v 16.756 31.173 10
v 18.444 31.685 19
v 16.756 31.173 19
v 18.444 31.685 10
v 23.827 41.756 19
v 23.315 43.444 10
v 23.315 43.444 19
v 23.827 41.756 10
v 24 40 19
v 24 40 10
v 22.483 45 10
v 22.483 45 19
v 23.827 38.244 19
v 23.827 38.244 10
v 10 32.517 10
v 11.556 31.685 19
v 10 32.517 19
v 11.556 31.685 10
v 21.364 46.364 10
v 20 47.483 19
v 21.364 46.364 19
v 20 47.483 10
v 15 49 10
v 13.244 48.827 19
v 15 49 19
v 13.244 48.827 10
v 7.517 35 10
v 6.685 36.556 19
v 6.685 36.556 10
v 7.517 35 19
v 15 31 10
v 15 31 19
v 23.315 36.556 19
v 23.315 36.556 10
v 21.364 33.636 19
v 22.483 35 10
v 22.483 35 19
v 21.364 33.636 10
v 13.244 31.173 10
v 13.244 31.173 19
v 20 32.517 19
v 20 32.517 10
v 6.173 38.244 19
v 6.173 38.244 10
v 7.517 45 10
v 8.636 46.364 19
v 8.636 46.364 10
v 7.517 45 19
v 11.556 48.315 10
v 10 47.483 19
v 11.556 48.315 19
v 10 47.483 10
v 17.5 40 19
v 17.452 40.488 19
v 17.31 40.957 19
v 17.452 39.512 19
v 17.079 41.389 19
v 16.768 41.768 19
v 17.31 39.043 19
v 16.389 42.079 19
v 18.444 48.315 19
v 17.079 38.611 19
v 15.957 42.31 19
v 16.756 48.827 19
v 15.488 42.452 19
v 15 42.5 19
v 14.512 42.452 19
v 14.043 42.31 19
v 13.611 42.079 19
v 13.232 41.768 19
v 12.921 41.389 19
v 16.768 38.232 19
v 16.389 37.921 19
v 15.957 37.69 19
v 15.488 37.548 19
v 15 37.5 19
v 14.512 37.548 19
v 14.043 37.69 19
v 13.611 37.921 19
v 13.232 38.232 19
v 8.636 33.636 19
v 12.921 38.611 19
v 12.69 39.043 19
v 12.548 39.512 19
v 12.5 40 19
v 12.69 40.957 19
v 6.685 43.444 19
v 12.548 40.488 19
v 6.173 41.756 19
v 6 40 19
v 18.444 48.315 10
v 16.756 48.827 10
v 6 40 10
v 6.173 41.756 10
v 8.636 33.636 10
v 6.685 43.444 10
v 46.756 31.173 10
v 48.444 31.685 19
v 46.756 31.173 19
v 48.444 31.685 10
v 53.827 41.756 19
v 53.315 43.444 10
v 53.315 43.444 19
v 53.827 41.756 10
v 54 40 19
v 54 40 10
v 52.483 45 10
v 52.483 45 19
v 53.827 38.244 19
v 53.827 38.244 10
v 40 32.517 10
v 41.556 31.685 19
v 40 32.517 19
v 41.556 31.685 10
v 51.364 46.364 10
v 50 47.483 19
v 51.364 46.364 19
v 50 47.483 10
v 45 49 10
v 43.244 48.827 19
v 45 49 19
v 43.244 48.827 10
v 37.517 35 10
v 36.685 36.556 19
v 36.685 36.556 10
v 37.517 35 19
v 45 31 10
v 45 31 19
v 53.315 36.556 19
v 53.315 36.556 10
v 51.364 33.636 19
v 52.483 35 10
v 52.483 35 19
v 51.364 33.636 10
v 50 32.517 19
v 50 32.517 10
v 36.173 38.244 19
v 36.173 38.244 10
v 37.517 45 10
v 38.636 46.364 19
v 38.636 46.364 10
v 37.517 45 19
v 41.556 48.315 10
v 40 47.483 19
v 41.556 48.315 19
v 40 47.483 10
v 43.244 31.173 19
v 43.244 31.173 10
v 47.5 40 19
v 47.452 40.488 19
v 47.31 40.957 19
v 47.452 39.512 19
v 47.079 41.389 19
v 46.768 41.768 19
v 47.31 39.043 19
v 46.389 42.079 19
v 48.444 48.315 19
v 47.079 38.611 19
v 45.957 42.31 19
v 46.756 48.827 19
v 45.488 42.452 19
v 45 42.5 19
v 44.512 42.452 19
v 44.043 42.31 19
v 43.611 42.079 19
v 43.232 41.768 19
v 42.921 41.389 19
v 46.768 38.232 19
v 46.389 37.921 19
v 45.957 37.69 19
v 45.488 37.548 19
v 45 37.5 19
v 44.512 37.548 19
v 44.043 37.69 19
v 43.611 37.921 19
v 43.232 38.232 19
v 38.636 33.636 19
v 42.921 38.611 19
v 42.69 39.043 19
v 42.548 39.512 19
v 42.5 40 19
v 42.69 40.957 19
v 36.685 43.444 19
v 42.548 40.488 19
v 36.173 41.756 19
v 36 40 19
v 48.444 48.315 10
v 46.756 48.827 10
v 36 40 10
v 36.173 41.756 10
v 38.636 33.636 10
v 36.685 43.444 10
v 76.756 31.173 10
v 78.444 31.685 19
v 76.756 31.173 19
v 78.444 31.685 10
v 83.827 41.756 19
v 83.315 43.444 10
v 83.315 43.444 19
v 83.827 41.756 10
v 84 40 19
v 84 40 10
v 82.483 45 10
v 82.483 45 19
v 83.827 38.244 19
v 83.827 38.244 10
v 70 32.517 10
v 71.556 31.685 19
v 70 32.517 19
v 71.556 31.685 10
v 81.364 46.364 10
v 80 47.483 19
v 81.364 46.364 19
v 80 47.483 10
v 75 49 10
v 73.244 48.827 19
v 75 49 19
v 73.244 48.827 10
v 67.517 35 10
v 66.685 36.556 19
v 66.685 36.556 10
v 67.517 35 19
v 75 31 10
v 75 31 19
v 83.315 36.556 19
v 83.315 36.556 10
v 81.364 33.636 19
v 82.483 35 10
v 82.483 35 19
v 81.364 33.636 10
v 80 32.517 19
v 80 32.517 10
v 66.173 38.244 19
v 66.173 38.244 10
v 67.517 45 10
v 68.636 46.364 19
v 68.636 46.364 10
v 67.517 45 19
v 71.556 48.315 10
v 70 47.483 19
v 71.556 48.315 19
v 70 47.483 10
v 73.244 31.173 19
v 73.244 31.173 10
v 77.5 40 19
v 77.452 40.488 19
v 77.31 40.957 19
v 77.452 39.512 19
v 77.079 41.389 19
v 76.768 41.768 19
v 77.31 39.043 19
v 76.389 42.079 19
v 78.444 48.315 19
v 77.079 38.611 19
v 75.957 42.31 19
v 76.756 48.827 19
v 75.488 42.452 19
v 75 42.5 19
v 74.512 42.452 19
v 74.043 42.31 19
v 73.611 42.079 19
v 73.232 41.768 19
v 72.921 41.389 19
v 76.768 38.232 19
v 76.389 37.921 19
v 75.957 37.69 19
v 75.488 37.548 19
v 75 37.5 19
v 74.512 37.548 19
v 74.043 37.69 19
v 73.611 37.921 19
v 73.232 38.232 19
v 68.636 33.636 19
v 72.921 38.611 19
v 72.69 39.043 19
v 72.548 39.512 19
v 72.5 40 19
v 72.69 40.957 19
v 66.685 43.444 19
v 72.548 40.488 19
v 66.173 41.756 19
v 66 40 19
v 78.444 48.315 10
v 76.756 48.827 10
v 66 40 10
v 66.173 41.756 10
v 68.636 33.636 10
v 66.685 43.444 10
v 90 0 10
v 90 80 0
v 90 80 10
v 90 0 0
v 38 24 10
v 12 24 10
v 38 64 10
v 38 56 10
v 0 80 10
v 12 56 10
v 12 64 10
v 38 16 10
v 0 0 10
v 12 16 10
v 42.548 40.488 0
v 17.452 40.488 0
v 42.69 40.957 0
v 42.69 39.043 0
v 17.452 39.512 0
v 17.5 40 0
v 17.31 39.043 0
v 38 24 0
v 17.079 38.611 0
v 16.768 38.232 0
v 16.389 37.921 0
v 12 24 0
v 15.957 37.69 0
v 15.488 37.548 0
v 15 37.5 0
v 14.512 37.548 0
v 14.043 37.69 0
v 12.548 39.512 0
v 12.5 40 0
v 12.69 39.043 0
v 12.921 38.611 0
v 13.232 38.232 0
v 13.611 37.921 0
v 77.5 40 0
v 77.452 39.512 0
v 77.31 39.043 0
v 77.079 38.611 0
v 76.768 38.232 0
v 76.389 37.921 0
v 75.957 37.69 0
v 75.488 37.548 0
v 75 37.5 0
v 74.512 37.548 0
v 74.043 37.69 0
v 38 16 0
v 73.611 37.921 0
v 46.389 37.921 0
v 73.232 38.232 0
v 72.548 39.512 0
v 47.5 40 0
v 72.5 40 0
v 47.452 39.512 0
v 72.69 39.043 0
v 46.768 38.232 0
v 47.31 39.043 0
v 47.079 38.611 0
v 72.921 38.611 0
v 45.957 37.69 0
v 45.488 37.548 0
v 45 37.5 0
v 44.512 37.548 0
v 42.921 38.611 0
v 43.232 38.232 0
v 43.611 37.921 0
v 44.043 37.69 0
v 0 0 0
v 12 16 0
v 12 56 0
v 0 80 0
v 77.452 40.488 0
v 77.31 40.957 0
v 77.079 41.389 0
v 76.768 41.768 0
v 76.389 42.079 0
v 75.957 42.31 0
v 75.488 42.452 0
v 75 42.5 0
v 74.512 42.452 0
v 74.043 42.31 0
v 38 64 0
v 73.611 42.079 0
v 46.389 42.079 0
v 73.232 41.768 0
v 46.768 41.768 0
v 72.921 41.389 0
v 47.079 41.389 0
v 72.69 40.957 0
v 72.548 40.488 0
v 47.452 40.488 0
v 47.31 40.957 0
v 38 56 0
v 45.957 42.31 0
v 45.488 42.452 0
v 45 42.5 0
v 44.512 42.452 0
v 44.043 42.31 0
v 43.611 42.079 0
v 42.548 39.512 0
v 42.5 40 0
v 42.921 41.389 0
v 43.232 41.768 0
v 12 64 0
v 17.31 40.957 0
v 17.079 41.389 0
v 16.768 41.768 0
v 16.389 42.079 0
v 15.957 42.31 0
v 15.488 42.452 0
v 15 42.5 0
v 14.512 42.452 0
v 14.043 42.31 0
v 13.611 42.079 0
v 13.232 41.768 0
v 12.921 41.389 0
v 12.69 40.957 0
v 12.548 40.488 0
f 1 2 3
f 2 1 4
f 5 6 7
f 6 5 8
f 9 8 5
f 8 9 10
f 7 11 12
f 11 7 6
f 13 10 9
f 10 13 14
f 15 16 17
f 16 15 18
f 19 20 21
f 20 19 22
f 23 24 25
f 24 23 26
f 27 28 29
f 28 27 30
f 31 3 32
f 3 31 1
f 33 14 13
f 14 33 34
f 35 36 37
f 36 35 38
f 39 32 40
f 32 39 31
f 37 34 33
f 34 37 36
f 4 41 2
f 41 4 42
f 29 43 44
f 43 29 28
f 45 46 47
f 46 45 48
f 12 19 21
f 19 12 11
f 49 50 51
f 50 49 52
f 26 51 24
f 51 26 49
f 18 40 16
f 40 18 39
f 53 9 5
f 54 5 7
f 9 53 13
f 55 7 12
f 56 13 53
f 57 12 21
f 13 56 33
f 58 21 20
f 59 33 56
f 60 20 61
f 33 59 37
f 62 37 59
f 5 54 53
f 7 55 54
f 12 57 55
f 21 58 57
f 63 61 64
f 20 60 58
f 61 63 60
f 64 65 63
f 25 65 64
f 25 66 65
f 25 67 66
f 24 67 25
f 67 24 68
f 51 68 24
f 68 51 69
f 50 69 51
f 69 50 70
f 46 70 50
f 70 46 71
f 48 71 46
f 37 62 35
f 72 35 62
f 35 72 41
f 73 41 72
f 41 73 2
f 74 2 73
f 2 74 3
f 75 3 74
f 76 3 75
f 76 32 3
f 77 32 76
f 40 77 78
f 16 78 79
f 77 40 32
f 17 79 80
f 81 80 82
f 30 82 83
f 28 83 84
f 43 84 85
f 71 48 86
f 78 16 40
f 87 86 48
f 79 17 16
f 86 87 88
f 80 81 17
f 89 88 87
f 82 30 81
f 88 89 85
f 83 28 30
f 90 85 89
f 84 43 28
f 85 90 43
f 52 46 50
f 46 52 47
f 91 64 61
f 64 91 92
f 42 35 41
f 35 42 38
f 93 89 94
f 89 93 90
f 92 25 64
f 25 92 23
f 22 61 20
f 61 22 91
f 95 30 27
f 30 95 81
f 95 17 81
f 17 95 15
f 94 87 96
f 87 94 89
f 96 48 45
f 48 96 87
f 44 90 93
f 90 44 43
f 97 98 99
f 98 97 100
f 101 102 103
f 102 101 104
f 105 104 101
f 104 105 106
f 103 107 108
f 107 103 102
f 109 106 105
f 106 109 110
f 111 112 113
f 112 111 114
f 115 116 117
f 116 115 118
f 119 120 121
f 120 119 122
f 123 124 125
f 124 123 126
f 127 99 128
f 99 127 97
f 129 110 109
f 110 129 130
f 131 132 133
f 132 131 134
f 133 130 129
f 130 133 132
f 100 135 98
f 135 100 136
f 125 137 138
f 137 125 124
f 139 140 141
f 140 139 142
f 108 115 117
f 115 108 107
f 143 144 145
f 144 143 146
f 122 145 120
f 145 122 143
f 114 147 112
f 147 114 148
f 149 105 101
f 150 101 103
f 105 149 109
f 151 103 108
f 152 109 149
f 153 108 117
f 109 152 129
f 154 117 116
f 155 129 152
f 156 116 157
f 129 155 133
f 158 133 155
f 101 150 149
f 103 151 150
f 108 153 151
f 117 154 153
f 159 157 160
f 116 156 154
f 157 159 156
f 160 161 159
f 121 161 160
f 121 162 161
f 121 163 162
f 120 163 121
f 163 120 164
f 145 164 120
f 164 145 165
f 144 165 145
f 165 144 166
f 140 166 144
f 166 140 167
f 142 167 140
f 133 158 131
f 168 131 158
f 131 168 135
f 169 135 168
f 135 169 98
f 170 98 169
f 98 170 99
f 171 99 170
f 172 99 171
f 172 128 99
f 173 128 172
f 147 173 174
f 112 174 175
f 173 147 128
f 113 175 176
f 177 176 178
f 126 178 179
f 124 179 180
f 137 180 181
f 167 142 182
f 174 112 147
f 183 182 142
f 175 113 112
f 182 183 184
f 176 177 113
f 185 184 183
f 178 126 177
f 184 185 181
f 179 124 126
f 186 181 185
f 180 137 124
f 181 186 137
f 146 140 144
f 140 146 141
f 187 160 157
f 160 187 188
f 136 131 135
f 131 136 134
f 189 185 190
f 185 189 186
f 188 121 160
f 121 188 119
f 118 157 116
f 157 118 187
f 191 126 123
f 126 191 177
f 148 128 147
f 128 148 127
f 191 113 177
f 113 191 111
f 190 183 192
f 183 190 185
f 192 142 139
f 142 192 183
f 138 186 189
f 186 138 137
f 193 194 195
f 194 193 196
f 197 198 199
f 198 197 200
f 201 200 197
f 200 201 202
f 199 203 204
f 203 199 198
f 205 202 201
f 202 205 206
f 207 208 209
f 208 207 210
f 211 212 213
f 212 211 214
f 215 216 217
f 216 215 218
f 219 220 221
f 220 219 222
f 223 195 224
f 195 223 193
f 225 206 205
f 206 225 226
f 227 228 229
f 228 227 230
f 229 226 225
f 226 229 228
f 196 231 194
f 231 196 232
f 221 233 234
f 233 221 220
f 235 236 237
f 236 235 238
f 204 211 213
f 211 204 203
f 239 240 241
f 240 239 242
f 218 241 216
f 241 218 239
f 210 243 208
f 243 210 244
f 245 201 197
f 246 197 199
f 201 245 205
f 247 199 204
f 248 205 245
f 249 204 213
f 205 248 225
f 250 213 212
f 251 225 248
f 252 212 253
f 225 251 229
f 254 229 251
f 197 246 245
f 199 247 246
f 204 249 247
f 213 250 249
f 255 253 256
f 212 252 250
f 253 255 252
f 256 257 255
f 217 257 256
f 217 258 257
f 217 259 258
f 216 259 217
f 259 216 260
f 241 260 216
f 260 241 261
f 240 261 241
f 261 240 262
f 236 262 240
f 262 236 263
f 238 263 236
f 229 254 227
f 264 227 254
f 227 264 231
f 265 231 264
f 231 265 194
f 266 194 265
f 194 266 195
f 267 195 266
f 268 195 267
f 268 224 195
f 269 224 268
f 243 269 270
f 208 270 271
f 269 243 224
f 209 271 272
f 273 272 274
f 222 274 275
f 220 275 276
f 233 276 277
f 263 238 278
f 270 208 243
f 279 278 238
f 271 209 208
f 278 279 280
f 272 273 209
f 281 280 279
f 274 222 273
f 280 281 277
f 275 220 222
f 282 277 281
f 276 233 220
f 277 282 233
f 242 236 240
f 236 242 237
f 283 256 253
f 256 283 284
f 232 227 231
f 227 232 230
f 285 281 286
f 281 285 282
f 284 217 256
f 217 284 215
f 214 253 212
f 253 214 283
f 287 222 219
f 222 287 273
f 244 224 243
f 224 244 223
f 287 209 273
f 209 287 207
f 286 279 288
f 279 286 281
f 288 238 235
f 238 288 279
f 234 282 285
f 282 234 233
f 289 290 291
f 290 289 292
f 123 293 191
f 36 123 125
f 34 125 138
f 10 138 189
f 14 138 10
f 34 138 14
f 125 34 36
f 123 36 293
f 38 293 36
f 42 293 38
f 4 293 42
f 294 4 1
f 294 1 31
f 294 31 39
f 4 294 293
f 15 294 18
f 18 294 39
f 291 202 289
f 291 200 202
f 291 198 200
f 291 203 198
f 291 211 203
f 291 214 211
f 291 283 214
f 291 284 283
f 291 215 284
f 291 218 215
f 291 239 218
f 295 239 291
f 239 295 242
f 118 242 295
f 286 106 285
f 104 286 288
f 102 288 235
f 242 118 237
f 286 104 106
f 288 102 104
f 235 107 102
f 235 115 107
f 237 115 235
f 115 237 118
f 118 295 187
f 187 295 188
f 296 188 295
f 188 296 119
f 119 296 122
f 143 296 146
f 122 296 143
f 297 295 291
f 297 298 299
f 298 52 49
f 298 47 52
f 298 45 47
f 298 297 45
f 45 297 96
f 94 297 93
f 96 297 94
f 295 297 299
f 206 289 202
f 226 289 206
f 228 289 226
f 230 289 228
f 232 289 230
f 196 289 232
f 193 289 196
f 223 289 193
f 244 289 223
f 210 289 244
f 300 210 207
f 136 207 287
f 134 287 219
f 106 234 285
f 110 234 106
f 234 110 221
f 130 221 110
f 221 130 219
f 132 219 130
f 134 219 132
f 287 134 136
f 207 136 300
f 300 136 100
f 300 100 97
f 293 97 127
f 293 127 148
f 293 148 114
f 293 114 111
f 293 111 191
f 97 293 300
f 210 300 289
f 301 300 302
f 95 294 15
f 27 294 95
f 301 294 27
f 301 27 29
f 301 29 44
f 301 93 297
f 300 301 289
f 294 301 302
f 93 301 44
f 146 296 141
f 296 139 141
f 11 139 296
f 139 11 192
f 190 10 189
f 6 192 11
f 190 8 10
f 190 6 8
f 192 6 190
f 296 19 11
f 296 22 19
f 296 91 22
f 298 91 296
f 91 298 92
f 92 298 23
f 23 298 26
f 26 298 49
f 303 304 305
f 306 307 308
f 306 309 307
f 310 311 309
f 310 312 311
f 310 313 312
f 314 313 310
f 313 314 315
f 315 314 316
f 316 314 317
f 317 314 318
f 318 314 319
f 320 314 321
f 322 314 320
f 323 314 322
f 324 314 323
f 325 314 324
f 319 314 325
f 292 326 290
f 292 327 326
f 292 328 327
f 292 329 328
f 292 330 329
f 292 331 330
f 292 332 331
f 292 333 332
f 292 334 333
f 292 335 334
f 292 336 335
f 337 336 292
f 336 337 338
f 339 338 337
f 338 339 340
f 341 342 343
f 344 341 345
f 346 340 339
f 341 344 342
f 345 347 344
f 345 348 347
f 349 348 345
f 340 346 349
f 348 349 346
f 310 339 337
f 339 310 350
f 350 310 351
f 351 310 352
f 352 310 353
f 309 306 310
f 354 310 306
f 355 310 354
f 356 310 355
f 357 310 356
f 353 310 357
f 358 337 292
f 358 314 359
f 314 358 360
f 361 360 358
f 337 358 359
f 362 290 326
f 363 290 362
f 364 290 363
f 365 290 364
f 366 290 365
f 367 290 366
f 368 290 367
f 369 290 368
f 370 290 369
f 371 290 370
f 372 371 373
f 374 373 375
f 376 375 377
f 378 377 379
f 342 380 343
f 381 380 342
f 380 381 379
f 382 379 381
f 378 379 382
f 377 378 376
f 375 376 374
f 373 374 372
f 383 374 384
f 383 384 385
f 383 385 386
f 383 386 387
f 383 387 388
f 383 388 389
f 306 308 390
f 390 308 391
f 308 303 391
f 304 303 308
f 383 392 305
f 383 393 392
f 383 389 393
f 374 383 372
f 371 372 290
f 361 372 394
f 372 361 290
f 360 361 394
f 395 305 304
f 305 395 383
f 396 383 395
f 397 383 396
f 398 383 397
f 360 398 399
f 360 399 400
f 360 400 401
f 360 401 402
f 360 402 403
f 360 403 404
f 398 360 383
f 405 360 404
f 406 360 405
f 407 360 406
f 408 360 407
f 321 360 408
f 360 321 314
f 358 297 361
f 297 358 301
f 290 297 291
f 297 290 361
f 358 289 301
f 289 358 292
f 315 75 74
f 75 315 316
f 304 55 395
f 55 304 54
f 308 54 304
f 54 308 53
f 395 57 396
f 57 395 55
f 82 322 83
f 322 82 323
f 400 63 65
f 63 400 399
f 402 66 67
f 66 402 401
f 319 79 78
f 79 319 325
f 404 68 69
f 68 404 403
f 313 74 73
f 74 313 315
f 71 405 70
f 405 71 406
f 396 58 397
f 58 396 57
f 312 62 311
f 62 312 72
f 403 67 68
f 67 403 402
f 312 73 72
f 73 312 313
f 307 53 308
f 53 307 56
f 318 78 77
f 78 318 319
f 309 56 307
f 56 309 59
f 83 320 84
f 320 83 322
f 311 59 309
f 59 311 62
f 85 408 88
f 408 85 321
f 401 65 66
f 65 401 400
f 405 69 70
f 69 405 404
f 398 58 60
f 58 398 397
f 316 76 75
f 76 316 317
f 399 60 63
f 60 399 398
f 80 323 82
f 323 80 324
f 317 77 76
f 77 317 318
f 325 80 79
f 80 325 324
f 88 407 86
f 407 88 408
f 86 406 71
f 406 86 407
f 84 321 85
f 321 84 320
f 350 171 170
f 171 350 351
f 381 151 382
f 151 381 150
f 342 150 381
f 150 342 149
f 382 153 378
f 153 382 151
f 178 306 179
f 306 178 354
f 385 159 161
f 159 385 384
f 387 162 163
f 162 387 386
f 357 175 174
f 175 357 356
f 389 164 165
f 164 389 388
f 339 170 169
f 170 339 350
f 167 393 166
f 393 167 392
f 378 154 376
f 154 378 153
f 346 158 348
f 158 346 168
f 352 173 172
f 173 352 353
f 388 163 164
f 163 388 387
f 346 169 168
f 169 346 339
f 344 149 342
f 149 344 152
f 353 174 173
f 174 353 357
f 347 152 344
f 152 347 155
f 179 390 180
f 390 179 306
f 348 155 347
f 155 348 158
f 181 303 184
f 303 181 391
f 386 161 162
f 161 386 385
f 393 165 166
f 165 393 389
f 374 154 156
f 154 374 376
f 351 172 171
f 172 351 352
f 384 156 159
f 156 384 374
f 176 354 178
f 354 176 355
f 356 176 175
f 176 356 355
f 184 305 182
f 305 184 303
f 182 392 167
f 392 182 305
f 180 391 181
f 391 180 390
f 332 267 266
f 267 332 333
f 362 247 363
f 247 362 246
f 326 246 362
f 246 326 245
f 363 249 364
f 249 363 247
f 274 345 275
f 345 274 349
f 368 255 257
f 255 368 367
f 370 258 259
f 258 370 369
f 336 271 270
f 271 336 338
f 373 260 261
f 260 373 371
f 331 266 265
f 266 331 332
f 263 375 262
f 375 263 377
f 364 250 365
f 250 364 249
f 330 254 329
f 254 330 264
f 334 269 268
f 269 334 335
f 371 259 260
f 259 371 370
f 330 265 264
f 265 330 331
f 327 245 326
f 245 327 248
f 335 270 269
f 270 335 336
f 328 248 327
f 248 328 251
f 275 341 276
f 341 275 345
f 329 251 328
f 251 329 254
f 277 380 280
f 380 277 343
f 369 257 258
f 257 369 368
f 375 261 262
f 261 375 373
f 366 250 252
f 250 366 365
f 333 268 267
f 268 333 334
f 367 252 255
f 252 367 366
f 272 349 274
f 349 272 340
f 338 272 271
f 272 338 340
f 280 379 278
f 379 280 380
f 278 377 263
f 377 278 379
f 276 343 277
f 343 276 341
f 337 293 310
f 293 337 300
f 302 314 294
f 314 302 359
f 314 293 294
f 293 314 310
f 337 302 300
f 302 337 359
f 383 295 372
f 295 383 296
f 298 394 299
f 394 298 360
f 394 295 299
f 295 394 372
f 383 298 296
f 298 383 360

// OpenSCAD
$fn = 32;

// ----------------------------------------------------------------------
// Drill jig: three_boss_slot jig
// ----------------------------------------------------------------------

// --- parameters (mm) ---
plate_l = 90;             // plate length, X
plate_w = 80;             // plate width, Y
plate_t = 10;             // plate thickness
boss_d = 18;              // guide boss diameter
boss_h = 10;              // boss height above the plate
guide_d = 5;              // guide hole diameter
boss_pitch = 30;          // boss pitch
slot_w = 8;               // clamp slot width
slot_l = 26;              // clamp slot length
slot_x = 12;              // slot start X

n_boss = 3;  // guide bosses
boss_x0 = (plate_l - (n_boss - 1) * boss_pitch) / 2;  // first boss X
boss_top = plate_t - 1 + boss_h;  // boss crown height
total_h = boss_top;  // overall height

difference() {
  union() {
  cube([plate_l, plate_w, plate_t]);
  for (i = [0 : n_boss - 1])
    translate([boss_x0 + i * boss_pitch, plate_w / 2, plate_t - 1])
      cylinder(h = boss_h, d = boss_d);
  }
  for (i = [0 : n_boss - 1])
    translate([boss_x0 + i * boss_pitch, plate_w / 2, -1])
      cylinder(h = plate_t + boss_h, d = guide_d);
  for (cy = [plate_w * 0.25, plate_w * 0.75])
    translate([slot_x, cy - slot_w / 2, -1])
      cube([slot_l, slot_w, plate_t + 2]);
}
